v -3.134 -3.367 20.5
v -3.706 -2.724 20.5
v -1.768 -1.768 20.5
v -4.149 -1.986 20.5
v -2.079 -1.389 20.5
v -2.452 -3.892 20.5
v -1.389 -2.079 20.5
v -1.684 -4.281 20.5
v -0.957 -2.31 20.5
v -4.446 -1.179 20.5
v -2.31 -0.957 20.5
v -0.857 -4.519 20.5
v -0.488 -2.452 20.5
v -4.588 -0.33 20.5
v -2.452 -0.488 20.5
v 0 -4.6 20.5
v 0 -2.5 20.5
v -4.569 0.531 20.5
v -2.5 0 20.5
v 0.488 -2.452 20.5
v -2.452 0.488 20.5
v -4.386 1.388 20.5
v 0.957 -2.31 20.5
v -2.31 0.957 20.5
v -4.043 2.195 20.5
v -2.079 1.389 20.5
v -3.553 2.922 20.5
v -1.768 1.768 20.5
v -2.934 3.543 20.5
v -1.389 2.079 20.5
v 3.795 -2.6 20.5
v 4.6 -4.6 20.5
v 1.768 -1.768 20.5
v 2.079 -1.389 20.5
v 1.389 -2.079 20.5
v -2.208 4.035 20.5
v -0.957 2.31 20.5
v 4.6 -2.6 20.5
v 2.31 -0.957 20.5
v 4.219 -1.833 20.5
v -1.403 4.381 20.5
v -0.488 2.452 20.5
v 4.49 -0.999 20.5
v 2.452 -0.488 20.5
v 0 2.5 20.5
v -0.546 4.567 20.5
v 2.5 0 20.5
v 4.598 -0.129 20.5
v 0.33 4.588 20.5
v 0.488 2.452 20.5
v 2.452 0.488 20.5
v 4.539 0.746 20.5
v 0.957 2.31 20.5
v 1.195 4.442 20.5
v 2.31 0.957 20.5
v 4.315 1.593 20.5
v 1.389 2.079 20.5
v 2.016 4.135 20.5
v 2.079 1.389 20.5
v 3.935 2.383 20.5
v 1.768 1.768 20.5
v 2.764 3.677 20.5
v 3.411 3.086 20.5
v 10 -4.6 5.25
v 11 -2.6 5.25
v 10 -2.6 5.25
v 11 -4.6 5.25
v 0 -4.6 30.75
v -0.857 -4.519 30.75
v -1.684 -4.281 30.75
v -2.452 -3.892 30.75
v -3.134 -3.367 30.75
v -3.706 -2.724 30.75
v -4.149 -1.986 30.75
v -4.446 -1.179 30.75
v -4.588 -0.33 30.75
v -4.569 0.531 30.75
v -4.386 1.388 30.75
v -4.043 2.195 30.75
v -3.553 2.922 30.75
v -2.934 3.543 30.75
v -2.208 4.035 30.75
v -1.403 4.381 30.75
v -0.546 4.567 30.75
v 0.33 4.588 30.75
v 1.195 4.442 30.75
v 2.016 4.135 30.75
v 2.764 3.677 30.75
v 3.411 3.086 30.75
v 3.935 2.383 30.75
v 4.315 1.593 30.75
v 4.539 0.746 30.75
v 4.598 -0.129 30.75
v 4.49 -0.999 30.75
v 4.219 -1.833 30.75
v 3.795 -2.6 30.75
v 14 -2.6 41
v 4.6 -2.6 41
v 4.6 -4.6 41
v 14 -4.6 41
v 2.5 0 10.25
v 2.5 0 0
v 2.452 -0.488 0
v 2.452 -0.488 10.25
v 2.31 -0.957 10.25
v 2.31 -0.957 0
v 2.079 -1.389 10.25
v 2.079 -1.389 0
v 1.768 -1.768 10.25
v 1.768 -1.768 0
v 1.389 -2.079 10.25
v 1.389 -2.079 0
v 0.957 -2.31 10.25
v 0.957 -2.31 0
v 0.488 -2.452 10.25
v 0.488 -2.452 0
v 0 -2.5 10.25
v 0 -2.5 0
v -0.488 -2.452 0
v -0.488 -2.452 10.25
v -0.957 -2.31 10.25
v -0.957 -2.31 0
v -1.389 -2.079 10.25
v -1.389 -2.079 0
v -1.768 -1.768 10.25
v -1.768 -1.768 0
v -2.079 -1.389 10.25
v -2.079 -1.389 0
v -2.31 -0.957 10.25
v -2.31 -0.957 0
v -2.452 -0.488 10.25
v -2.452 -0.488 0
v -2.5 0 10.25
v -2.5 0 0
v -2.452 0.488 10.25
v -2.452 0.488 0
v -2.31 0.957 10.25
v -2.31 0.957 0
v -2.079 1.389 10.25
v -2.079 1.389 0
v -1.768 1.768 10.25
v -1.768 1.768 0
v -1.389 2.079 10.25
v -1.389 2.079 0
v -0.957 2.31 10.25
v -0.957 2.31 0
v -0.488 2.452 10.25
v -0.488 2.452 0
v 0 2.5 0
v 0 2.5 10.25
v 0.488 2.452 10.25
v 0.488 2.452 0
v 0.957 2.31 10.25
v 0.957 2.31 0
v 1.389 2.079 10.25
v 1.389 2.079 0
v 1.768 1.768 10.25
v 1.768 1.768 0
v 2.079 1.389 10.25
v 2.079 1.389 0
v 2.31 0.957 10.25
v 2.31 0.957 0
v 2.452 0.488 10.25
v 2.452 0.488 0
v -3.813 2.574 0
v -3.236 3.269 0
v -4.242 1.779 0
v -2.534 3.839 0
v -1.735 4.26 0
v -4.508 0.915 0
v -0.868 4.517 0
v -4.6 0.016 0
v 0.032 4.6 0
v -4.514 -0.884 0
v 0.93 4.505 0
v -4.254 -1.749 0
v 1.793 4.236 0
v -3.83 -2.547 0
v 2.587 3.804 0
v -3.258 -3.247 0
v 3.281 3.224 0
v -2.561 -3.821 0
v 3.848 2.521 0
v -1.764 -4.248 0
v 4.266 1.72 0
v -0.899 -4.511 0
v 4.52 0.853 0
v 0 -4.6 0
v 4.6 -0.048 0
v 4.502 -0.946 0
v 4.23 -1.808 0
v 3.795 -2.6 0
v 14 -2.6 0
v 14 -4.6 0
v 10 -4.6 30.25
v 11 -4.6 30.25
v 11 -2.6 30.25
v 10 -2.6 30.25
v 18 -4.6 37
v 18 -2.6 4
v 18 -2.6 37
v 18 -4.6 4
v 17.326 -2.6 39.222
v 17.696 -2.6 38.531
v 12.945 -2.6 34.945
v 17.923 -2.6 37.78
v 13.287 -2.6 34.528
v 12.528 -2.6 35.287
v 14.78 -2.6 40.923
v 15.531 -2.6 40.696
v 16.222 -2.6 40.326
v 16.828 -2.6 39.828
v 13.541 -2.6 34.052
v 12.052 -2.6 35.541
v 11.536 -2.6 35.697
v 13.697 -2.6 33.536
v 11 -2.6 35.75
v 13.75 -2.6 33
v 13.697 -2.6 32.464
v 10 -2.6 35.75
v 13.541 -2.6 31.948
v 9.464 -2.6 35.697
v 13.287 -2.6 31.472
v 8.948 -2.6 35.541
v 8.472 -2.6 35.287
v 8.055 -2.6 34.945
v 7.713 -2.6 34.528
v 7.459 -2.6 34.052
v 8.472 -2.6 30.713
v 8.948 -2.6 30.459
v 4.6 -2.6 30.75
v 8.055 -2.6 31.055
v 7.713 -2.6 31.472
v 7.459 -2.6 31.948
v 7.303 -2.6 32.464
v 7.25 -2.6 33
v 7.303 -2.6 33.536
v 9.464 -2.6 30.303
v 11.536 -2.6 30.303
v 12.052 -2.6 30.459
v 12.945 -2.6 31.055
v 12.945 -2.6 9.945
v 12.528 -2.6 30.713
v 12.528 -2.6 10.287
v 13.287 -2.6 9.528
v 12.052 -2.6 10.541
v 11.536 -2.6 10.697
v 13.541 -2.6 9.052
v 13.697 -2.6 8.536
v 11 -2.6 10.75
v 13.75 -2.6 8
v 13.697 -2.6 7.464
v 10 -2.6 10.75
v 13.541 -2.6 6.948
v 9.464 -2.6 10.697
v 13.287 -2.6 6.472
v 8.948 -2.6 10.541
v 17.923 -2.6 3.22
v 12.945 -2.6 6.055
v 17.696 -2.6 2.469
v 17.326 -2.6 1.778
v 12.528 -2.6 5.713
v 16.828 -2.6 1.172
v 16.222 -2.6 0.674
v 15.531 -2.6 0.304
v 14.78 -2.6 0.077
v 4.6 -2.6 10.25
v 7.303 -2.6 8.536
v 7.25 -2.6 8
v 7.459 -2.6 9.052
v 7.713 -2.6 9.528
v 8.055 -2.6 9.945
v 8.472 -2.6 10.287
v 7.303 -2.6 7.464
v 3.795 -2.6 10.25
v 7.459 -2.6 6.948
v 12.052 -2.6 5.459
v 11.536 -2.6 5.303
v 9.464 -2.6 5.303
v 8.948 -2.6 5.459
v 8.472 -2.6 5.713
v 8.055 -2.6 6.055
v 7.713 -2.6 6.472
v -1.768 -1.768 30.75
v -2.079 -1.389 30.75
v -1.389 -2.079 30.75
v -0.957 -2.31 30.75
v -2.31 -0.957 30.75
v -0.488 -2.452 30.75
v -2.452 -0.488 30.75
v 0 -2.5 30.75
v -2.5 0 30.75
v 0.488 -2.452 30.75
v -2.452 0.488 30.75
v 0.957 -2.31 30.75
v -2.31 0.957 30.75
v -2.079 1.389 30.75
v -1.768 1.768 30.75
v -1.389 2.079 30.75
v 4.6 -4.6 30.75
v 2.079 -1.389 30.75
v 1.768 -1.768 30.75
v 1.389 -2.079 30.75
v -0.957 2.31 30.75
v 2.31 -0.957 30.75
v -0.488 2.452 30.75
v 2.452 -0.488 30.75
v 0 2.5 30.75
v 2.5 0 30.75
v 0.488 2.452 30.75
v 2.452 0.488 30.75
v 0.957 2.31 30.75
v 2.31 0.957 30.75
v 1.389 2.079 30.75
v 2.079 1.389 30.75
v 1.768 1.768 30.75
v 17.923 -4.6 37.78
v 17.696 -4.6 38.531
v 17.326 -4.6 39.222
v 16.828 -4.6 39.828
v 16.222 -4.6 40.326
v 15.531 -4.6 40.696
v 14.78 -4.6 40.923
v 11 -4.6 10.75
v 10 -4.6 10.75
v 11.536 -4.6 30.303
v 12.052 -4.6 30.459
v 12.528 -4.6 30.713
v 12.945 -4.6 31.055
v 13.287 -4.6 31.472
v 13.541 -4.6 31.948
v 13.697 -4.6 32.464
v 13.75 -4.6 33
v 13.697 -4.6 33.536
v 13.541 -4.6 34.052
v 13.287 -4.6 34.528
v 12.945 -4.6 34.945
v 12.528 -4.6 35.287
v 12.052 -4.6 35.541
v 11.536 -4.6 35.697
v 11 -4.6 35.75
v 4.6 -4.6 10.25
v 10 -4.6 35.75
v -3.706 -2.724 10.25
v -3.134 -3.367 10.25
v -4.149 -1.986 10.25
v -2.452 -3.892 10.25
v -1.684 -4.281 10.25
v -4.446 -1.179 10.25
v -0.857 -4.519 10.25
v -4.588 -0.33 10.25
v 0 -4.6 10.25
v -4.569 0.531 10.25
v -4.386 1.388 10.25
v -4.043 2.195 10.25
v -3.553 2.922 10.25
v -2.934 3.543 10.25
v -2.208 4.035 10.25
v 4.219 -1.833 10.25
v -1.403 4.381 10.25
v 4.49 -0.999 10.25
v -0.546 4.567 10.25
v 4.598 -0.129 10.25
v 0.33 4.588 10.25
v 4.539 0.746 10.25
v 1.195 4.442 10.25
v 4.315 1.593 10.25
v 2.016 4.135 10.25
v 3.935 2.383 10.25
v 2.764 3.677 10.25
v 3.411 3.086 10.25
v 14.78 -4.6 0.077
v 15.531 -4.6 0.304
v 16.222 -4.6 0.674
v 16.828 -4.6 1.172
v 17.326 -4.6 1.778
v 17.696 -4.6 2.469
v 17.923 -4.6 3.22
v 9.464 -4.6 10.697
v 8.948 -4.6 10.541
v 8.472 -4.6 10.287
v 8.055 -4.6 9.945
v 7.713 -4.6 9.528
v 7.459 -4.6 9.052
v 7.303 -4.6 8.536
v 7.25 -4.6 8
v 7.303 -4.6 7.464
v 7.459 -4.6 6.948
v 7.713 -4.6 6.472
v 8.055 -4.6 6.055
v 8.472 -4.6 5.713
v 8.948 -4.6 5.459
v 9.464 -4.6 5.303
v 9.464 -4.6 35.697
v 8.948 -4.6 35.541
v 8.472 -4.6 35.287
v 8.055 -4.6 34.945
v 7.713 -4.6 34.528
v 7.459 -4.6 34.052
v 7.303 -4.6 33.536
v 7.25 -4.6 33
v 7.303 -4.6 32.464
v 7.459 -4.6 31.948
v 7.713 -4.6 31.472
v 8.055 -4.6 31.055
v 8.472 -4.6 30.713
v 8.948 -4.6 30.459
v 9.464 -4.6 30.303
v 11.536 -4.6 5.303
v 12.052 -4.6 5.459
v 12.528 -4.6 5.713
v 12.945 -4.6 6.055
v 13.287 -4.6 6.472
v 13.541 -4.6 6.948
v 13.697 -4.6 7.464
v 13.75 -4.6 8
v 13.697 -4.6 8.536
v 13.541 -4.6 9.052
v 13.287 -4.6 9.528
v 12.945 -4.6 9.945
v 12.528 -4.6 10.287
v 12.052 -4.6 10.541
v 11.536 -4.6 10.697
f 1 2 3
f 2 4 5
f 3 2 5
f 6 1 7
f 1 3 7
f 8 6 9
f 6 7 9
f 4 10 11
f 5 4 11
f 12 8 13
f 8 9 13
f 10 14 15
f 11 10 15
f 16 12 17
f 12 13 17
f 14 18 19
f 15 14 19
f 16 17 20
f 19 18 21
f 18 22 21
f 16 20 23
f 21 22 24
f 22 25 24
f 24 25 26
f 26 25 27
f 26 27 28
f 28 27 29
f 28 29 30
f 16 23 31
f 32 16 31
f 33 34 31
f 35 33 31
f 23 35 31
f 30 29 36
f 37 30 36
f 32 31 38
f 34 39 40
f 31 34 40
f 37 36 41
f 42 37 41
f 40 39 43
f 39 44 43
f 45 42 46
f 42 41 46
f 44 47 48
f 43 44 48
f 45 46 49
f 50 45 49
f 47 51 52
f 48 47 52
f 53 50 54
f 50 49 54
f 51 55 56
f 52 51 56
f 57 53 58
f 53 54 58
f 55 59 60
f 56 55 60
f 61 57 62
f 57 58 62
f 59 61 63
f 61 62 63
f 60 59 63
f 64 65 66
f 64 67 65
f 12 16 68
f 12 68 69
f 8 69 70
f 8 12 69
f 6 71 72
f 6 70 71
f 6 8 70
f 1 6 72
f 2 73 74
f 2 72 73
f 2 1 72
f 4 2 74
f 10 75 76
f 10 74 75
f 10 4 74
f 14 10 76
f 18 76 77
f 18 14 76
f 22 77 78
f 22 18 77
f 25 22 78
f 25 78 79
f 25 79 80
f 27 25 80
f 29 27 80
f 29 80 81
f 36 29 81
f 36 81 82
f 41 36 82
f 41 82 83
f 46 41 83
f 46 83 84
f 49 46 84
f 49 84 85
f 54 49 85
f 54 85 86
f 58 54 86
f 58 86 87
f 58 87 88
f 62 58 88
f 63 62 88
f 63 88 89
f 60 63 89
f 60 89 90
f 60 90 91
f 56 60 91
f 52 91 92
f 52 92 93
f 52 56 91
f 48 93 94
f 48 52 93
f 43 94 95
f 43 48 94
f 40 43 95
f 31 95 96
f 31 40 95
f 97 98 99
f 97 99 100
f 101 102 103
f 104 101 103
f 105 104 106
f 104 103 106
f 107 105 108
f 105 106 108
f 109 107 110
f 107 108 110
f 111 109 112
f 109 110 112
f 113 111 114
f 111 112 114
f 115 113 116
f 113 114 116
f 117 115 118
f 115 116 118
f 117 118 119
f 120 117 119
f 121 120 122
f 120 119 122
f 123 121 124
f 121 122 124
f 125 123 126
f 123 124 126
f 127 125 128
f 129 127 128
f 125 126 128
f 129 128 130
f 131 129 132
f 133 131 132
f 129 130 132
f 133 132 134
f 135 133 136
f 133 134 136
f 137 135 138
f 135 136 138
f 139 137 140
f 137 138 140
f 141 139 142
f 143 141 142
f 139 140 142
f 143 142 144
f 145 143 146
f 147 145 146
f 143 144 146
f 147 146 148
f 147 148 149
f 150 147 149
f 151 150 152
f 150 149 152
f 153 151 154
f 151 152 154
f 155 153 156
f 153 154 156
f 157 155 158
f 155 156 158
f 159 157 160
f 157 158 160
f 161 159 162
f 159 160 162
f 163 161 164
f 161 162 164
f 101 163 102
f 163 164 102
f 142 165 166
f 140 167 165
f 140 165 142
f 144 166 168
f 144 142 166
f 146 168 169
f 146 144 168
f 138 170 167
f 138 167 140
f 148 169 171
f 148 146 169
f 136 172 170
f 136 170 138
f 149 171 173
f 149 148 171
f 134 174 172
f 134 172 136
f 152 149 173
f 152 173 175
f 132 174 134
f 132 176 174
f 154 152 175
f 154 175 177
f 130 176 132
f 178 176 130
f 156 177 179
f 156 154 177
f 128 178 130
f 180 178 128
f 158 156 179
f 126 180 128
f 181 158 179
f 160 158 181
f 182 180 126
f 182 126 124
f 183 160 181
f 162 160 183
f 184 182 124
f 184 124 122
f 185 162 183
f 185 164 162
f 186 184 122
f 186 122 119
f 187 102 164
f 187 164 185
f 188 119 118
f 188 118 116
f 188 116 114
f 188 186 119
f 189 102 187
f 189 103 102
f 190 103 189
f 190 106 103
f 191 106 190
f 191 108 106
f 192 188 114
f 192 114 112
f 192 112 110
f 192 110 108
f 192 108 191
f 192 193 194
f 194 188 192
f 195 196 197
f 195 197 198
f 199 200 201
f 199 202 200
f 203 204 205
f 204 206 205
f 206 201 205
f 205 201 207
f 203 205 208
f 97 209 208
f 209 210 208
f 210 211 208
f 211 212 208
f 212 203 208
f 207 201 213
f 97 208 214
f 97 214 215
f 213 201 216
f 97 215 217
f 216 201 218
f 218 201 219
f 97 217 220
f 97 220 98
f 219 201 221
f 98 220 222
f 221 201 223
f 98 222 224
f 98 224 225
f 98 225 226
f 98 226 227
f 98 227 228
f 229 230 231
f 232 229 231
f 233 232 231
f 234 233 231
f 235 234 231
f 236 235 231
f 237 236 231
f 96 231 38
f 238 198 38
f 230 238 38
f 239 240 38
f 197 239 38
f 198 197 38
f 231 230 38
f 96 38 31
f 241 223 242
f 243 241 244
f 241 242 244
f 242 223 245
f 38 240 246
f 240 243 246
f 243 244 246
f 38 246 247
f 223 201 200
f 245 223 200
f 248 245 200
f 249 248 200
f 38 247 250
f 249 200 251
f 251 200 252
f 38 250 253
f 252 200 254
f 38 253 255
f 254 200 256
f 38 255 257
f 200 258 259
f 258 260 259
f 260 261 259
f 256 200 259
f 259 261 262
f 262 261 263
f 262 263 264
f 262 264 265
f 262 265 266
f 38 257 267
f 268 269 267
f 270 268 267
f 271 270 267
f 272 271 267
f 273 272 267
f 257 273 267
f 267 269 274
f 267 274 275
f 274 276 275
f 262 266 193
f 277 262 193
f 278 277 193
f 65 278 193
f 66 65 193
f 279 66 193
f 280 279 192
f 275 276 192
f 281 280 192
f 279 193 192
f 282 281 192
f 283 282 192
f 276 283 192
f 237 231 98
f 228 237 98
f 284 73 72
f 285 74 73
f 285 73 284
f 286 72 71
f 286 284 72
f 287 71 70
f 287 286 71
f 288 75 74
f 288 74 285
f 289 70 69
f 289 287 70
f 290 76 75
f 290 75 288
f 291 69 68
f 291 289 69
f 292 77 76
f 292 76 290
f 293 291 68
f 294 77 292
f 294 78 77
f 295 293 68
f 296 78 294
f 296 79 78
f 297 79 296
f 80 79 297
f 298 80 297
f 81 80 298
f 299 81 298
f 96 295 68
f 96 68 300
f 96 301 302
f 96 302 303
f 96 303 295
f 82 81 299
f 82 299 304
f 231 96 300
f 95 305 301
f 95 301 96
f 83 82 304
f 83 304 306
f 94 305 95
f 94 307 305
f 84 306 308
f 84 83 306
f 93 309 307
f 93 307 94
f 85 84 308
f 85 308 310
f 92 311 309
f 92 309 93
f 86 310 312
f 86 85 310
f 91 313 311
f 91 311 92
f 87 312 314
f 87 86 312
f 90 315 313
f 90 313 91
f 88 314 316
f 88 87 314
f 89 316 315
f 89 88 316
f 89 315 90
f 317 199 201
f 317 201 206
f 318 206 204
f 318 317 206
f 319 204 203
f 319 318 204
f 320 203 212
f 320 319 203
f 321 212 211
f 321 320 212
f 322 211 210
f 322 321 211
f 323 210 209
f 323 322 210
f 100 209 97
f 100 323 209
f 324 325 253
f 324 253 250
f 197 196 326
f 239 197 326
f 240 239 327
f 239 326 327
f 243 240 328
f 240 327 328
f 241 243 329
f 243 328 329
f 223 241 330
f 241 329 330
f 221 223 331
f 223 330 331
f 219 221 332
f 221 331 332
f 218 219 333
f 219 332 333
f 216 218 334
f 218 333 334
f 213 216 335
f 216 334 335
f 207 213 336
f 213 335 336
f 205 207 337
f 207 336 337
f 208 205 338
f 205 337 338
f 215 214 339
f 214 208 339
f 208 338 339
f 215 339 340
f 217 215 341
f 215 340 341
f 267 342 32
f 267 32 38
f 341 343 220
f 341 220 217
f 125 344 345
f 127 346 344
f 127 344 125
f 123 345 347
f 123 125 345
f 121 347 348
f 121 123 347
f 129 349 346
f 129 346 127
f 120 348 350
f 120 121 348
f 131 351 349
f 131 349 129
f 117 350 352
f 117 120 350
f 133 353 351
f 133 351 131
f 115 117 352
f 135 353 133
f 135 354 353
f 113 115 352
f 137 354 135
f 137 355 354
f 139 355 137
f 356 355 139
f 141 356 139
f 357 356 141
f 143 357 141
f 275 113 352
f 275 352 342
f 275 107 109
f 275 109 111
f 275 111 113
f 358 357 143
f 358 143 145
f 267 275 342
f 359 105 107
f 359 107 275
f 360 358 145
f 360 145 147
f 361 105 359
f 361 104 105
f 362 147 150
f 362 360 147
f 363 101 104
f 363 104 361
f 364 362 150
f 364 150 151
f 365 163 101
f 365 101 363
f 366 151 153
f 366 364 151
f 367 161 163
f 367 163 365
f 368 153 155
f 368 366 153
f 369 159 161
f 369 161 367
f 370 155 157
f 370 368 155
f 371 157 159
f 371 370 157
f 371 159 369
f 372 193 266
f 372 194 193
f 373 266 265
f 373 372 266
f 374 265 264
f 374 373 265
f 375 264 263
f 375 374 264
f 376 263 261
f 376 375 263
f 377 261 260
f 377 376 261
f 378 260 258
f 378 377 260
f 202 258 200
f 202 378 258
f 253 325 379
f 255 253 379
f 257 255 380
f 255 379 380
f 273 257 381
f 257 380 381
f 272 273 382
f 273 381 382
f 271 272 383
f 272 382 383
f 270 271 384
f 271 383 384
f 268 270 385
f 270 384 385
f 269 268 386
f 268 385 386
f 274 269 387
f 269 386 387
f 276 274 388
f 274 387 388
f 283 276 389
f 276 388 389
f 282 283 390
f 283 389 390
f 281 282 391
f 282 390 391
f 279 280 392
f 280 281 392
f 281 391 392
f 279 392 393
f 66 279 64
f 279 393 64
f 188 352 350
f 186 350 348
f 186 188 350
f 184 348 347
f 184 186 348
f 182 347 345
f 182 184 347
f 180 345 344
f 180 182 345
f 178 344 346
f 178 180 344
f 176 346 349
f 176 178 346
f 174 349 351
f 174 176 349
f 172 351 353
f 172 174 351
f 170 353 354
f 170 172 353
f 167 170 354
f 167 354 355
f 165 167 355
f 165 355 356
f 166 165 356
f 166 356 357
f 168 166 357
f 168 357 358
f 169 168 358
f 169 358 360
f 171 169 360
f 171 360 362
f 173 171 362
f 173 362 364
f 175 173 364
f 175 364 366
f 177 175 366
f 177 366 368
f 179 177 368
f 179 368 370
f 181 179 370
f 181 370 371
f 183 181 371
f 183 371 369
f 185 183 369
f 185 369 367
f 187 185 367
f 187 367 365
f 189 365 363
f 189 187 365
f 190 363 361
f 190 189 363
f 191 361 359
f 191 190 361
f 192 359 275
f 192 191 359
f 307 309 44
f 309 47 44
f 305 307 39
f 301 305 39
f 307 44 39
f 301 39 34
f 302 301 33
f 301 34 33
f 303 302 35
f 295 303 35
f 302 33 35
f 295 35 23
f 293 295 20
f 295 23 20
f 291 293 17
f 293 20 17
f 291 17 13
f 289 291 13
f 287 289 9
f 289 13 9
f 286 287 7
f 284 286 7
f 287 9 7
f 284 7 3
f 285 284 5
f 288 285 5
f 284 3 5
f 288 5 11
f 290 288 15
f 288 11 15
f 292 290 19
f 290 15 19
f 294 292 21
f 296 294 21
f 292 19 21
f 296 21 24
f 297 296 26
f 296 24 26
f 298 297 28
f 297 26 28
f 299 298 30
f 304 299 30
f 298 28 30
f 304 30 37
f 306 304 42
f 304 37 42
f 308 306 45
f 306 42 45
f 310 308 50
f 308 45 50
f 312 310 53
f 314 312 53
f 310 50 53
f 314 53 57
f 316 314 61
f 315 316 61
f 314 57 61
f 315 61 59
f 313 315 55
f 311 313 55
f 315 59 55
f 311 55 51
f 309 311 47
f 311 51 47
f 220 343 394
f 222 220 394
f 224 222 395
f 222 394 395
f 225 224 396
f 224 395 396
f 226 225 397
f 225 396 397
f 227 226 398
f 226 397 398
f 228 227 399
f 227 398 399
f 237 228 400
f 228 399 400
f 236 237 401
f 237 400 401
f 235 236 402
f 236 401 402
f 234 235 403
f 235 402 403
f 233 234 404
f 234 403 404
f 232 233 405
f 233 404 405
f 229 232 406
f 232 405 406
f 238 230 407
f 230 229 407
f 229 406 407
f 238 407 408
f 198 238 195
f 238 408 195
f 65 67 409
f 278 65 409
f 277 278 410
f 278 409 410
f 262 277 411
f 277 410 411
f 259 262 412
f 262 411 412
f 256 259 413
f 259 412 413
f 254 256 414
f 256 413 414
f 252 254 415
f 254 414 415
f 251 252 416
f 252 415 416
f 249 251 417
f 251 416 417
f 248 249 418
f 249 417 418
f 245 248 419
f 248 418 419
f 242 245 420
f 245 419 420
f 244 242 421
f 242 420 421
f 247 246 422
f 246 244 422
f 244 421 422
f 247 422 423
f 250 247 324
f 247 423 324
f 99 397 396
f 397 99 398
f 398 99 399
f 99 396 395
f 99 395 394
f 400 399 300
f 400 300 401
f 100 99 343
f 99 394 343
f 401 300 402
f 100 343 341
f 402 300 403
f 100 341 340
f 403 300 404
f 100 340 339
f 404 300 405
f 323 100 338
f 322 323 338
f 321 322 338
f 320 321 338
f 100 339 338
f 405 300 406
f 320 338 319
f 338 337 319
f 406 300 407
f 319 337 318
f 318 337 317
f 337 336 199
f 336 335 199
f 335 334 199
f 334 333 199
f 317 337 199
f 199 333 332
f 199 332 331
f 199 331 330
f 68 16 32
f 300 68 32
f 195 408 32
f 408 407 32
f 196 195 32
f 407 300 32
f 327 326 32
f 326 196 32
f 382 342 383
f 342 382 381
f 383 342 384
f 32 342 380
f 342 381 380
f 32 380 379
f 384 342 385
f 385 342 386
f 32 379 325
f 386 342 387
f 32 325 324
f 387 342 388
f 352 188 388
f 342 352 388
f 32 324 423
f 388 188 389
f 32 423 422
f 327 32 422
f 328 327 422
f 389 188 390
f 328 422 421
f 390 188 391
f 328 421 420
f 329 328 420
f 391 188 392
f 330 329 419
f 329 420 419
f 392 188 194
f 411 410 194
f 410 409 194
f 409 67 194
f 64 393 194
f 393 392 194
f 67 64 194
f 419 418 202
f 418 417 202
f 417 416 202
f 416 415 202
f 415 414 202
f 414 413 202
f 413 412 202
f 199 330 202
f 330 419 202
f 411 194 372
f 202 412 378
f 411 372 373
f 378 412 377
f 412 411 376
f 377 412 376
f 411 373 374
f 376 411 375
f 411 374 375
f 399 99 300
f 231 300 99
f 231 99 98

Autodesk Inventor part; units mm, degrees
sketch "Sketch_1" plane through (0, 0, 0) normal (0, 0, 1) x (1, 0, 0)
  arc A0 (3.7947, -2.6) -> (0, -4.6) centre (0, 0) ccw
  line L0 (0, -4.6) -> (18, -4.6)
  line L1 (18, -4.6) -> (18, -2.6)
  line L2 (18, -2.6) -> (3.7947, -2.6)
  circle A1 centre (0, 0) radius 2.5
extrude "Extrusion1" add sketch "Sketch_1" along normal blind 41
sketch "Sketch_2" plane through (0, -4.6, 0) normal (0, 1, 0) x (1, 0, 0)
  line L0 (9.2, -41) -> (9.2, -43)
  line L1 (9.2, -43) -> (20, -43)
  line L2 (20, -43) -> (20, 2)
  line L3 (20, 2) -> (9.2, 2)
  line L4 (9.2, 2) -> (9.2, 0)
  line L5 (9.2, 0) -> (14, 0)
  arc A0 (18, -4) -> (14, 0) centre (14, -4) ccw
  line L6 (18, -4) -> (18, -37)
  arc A1 (14, -41) -> (18, -37) centre (14, -37) ccw
  line L7 (14, -41) -> (9.2, -41)
extrude "Extrusion2" cut sketch "Sketch_2" along normal blind 2
sketch "Sketch_7" plane through (0, 0, 20.5) normal (0, 0, 1) x (1, 0, 0)
  arc A0 (4.6, 0) -> (0, -4.6) centre (0, 0) ccw
  line L0 (0, -4.6) -> (4.6, -4.6)
  line L1 (4.6, -4.6) -> (4.6, 0)
extrude "Extrusion3" cut sketch "Sketch_7" against normal blind 10.25
sketch "Sketch_5" plane through (0, 0, 41) normal (0, 0, 1) x (1, 0, 0)
  arc A0 (4.6, 0) -> (0, -4.6) centre (0, 0) ccw
  line L0 (0, -4.6) -> (4.6, -4.6)
  line L1 (4.6, -4.6) -> (4.6, 0)
extrude "Extrusion4" cut sketch "Sketch_5" against normal blind 10.25
sketch "Sketch_3" plane through (0, -4.6, 0) normal (0, 1, 0) x (1, 0, 0)
  arc A0 (10, -5.25) -> (10, -10.75) centre (10, -8) ccw
  line L0 (10, -10.75) -> (11, -10.75)
  arc A1 (11, -10.75) -> (11, -5.25) centre (11, -8) ccw
  line L1 (11, -5.25) -> (10, -5.25)
extrude "Extrusion5" cut sketch "Sketch_3" along normal blind 2
sketch "Sketch_4" plane through (0, -4.6, 0) normal (0, 1, 0) x (1, 0, 0)
  arc A0 (10, -30.25) -> (10, -35.75) centre (10, -33) ccw
  line L0 (10, -35.75) -> (11, -35.75)
  arc A1 (11, -35.75) -> (11, -30.25) centre (11, -33) ccw
  line L1 (11, -30.25) -> (10, -30.25)
extrude "Extrusion6" cut sketch "Sketch_4" along normal blind 2
ref_plane "2_to_1_XY" through (0, 0, 20.5) normal (0, 0, 1) x (1, 0, 0)
ref_plane "2_to_1_YZ" through (0, 0, 20.5) normal (1, 0, 0) x (0, 1, 0)
ref_plane "2_to_1_ZX" through (0, 0, 20.5) normal (0, 1, 0) x (0, 0, 1)
properties part number "SHPSNA5_2"
